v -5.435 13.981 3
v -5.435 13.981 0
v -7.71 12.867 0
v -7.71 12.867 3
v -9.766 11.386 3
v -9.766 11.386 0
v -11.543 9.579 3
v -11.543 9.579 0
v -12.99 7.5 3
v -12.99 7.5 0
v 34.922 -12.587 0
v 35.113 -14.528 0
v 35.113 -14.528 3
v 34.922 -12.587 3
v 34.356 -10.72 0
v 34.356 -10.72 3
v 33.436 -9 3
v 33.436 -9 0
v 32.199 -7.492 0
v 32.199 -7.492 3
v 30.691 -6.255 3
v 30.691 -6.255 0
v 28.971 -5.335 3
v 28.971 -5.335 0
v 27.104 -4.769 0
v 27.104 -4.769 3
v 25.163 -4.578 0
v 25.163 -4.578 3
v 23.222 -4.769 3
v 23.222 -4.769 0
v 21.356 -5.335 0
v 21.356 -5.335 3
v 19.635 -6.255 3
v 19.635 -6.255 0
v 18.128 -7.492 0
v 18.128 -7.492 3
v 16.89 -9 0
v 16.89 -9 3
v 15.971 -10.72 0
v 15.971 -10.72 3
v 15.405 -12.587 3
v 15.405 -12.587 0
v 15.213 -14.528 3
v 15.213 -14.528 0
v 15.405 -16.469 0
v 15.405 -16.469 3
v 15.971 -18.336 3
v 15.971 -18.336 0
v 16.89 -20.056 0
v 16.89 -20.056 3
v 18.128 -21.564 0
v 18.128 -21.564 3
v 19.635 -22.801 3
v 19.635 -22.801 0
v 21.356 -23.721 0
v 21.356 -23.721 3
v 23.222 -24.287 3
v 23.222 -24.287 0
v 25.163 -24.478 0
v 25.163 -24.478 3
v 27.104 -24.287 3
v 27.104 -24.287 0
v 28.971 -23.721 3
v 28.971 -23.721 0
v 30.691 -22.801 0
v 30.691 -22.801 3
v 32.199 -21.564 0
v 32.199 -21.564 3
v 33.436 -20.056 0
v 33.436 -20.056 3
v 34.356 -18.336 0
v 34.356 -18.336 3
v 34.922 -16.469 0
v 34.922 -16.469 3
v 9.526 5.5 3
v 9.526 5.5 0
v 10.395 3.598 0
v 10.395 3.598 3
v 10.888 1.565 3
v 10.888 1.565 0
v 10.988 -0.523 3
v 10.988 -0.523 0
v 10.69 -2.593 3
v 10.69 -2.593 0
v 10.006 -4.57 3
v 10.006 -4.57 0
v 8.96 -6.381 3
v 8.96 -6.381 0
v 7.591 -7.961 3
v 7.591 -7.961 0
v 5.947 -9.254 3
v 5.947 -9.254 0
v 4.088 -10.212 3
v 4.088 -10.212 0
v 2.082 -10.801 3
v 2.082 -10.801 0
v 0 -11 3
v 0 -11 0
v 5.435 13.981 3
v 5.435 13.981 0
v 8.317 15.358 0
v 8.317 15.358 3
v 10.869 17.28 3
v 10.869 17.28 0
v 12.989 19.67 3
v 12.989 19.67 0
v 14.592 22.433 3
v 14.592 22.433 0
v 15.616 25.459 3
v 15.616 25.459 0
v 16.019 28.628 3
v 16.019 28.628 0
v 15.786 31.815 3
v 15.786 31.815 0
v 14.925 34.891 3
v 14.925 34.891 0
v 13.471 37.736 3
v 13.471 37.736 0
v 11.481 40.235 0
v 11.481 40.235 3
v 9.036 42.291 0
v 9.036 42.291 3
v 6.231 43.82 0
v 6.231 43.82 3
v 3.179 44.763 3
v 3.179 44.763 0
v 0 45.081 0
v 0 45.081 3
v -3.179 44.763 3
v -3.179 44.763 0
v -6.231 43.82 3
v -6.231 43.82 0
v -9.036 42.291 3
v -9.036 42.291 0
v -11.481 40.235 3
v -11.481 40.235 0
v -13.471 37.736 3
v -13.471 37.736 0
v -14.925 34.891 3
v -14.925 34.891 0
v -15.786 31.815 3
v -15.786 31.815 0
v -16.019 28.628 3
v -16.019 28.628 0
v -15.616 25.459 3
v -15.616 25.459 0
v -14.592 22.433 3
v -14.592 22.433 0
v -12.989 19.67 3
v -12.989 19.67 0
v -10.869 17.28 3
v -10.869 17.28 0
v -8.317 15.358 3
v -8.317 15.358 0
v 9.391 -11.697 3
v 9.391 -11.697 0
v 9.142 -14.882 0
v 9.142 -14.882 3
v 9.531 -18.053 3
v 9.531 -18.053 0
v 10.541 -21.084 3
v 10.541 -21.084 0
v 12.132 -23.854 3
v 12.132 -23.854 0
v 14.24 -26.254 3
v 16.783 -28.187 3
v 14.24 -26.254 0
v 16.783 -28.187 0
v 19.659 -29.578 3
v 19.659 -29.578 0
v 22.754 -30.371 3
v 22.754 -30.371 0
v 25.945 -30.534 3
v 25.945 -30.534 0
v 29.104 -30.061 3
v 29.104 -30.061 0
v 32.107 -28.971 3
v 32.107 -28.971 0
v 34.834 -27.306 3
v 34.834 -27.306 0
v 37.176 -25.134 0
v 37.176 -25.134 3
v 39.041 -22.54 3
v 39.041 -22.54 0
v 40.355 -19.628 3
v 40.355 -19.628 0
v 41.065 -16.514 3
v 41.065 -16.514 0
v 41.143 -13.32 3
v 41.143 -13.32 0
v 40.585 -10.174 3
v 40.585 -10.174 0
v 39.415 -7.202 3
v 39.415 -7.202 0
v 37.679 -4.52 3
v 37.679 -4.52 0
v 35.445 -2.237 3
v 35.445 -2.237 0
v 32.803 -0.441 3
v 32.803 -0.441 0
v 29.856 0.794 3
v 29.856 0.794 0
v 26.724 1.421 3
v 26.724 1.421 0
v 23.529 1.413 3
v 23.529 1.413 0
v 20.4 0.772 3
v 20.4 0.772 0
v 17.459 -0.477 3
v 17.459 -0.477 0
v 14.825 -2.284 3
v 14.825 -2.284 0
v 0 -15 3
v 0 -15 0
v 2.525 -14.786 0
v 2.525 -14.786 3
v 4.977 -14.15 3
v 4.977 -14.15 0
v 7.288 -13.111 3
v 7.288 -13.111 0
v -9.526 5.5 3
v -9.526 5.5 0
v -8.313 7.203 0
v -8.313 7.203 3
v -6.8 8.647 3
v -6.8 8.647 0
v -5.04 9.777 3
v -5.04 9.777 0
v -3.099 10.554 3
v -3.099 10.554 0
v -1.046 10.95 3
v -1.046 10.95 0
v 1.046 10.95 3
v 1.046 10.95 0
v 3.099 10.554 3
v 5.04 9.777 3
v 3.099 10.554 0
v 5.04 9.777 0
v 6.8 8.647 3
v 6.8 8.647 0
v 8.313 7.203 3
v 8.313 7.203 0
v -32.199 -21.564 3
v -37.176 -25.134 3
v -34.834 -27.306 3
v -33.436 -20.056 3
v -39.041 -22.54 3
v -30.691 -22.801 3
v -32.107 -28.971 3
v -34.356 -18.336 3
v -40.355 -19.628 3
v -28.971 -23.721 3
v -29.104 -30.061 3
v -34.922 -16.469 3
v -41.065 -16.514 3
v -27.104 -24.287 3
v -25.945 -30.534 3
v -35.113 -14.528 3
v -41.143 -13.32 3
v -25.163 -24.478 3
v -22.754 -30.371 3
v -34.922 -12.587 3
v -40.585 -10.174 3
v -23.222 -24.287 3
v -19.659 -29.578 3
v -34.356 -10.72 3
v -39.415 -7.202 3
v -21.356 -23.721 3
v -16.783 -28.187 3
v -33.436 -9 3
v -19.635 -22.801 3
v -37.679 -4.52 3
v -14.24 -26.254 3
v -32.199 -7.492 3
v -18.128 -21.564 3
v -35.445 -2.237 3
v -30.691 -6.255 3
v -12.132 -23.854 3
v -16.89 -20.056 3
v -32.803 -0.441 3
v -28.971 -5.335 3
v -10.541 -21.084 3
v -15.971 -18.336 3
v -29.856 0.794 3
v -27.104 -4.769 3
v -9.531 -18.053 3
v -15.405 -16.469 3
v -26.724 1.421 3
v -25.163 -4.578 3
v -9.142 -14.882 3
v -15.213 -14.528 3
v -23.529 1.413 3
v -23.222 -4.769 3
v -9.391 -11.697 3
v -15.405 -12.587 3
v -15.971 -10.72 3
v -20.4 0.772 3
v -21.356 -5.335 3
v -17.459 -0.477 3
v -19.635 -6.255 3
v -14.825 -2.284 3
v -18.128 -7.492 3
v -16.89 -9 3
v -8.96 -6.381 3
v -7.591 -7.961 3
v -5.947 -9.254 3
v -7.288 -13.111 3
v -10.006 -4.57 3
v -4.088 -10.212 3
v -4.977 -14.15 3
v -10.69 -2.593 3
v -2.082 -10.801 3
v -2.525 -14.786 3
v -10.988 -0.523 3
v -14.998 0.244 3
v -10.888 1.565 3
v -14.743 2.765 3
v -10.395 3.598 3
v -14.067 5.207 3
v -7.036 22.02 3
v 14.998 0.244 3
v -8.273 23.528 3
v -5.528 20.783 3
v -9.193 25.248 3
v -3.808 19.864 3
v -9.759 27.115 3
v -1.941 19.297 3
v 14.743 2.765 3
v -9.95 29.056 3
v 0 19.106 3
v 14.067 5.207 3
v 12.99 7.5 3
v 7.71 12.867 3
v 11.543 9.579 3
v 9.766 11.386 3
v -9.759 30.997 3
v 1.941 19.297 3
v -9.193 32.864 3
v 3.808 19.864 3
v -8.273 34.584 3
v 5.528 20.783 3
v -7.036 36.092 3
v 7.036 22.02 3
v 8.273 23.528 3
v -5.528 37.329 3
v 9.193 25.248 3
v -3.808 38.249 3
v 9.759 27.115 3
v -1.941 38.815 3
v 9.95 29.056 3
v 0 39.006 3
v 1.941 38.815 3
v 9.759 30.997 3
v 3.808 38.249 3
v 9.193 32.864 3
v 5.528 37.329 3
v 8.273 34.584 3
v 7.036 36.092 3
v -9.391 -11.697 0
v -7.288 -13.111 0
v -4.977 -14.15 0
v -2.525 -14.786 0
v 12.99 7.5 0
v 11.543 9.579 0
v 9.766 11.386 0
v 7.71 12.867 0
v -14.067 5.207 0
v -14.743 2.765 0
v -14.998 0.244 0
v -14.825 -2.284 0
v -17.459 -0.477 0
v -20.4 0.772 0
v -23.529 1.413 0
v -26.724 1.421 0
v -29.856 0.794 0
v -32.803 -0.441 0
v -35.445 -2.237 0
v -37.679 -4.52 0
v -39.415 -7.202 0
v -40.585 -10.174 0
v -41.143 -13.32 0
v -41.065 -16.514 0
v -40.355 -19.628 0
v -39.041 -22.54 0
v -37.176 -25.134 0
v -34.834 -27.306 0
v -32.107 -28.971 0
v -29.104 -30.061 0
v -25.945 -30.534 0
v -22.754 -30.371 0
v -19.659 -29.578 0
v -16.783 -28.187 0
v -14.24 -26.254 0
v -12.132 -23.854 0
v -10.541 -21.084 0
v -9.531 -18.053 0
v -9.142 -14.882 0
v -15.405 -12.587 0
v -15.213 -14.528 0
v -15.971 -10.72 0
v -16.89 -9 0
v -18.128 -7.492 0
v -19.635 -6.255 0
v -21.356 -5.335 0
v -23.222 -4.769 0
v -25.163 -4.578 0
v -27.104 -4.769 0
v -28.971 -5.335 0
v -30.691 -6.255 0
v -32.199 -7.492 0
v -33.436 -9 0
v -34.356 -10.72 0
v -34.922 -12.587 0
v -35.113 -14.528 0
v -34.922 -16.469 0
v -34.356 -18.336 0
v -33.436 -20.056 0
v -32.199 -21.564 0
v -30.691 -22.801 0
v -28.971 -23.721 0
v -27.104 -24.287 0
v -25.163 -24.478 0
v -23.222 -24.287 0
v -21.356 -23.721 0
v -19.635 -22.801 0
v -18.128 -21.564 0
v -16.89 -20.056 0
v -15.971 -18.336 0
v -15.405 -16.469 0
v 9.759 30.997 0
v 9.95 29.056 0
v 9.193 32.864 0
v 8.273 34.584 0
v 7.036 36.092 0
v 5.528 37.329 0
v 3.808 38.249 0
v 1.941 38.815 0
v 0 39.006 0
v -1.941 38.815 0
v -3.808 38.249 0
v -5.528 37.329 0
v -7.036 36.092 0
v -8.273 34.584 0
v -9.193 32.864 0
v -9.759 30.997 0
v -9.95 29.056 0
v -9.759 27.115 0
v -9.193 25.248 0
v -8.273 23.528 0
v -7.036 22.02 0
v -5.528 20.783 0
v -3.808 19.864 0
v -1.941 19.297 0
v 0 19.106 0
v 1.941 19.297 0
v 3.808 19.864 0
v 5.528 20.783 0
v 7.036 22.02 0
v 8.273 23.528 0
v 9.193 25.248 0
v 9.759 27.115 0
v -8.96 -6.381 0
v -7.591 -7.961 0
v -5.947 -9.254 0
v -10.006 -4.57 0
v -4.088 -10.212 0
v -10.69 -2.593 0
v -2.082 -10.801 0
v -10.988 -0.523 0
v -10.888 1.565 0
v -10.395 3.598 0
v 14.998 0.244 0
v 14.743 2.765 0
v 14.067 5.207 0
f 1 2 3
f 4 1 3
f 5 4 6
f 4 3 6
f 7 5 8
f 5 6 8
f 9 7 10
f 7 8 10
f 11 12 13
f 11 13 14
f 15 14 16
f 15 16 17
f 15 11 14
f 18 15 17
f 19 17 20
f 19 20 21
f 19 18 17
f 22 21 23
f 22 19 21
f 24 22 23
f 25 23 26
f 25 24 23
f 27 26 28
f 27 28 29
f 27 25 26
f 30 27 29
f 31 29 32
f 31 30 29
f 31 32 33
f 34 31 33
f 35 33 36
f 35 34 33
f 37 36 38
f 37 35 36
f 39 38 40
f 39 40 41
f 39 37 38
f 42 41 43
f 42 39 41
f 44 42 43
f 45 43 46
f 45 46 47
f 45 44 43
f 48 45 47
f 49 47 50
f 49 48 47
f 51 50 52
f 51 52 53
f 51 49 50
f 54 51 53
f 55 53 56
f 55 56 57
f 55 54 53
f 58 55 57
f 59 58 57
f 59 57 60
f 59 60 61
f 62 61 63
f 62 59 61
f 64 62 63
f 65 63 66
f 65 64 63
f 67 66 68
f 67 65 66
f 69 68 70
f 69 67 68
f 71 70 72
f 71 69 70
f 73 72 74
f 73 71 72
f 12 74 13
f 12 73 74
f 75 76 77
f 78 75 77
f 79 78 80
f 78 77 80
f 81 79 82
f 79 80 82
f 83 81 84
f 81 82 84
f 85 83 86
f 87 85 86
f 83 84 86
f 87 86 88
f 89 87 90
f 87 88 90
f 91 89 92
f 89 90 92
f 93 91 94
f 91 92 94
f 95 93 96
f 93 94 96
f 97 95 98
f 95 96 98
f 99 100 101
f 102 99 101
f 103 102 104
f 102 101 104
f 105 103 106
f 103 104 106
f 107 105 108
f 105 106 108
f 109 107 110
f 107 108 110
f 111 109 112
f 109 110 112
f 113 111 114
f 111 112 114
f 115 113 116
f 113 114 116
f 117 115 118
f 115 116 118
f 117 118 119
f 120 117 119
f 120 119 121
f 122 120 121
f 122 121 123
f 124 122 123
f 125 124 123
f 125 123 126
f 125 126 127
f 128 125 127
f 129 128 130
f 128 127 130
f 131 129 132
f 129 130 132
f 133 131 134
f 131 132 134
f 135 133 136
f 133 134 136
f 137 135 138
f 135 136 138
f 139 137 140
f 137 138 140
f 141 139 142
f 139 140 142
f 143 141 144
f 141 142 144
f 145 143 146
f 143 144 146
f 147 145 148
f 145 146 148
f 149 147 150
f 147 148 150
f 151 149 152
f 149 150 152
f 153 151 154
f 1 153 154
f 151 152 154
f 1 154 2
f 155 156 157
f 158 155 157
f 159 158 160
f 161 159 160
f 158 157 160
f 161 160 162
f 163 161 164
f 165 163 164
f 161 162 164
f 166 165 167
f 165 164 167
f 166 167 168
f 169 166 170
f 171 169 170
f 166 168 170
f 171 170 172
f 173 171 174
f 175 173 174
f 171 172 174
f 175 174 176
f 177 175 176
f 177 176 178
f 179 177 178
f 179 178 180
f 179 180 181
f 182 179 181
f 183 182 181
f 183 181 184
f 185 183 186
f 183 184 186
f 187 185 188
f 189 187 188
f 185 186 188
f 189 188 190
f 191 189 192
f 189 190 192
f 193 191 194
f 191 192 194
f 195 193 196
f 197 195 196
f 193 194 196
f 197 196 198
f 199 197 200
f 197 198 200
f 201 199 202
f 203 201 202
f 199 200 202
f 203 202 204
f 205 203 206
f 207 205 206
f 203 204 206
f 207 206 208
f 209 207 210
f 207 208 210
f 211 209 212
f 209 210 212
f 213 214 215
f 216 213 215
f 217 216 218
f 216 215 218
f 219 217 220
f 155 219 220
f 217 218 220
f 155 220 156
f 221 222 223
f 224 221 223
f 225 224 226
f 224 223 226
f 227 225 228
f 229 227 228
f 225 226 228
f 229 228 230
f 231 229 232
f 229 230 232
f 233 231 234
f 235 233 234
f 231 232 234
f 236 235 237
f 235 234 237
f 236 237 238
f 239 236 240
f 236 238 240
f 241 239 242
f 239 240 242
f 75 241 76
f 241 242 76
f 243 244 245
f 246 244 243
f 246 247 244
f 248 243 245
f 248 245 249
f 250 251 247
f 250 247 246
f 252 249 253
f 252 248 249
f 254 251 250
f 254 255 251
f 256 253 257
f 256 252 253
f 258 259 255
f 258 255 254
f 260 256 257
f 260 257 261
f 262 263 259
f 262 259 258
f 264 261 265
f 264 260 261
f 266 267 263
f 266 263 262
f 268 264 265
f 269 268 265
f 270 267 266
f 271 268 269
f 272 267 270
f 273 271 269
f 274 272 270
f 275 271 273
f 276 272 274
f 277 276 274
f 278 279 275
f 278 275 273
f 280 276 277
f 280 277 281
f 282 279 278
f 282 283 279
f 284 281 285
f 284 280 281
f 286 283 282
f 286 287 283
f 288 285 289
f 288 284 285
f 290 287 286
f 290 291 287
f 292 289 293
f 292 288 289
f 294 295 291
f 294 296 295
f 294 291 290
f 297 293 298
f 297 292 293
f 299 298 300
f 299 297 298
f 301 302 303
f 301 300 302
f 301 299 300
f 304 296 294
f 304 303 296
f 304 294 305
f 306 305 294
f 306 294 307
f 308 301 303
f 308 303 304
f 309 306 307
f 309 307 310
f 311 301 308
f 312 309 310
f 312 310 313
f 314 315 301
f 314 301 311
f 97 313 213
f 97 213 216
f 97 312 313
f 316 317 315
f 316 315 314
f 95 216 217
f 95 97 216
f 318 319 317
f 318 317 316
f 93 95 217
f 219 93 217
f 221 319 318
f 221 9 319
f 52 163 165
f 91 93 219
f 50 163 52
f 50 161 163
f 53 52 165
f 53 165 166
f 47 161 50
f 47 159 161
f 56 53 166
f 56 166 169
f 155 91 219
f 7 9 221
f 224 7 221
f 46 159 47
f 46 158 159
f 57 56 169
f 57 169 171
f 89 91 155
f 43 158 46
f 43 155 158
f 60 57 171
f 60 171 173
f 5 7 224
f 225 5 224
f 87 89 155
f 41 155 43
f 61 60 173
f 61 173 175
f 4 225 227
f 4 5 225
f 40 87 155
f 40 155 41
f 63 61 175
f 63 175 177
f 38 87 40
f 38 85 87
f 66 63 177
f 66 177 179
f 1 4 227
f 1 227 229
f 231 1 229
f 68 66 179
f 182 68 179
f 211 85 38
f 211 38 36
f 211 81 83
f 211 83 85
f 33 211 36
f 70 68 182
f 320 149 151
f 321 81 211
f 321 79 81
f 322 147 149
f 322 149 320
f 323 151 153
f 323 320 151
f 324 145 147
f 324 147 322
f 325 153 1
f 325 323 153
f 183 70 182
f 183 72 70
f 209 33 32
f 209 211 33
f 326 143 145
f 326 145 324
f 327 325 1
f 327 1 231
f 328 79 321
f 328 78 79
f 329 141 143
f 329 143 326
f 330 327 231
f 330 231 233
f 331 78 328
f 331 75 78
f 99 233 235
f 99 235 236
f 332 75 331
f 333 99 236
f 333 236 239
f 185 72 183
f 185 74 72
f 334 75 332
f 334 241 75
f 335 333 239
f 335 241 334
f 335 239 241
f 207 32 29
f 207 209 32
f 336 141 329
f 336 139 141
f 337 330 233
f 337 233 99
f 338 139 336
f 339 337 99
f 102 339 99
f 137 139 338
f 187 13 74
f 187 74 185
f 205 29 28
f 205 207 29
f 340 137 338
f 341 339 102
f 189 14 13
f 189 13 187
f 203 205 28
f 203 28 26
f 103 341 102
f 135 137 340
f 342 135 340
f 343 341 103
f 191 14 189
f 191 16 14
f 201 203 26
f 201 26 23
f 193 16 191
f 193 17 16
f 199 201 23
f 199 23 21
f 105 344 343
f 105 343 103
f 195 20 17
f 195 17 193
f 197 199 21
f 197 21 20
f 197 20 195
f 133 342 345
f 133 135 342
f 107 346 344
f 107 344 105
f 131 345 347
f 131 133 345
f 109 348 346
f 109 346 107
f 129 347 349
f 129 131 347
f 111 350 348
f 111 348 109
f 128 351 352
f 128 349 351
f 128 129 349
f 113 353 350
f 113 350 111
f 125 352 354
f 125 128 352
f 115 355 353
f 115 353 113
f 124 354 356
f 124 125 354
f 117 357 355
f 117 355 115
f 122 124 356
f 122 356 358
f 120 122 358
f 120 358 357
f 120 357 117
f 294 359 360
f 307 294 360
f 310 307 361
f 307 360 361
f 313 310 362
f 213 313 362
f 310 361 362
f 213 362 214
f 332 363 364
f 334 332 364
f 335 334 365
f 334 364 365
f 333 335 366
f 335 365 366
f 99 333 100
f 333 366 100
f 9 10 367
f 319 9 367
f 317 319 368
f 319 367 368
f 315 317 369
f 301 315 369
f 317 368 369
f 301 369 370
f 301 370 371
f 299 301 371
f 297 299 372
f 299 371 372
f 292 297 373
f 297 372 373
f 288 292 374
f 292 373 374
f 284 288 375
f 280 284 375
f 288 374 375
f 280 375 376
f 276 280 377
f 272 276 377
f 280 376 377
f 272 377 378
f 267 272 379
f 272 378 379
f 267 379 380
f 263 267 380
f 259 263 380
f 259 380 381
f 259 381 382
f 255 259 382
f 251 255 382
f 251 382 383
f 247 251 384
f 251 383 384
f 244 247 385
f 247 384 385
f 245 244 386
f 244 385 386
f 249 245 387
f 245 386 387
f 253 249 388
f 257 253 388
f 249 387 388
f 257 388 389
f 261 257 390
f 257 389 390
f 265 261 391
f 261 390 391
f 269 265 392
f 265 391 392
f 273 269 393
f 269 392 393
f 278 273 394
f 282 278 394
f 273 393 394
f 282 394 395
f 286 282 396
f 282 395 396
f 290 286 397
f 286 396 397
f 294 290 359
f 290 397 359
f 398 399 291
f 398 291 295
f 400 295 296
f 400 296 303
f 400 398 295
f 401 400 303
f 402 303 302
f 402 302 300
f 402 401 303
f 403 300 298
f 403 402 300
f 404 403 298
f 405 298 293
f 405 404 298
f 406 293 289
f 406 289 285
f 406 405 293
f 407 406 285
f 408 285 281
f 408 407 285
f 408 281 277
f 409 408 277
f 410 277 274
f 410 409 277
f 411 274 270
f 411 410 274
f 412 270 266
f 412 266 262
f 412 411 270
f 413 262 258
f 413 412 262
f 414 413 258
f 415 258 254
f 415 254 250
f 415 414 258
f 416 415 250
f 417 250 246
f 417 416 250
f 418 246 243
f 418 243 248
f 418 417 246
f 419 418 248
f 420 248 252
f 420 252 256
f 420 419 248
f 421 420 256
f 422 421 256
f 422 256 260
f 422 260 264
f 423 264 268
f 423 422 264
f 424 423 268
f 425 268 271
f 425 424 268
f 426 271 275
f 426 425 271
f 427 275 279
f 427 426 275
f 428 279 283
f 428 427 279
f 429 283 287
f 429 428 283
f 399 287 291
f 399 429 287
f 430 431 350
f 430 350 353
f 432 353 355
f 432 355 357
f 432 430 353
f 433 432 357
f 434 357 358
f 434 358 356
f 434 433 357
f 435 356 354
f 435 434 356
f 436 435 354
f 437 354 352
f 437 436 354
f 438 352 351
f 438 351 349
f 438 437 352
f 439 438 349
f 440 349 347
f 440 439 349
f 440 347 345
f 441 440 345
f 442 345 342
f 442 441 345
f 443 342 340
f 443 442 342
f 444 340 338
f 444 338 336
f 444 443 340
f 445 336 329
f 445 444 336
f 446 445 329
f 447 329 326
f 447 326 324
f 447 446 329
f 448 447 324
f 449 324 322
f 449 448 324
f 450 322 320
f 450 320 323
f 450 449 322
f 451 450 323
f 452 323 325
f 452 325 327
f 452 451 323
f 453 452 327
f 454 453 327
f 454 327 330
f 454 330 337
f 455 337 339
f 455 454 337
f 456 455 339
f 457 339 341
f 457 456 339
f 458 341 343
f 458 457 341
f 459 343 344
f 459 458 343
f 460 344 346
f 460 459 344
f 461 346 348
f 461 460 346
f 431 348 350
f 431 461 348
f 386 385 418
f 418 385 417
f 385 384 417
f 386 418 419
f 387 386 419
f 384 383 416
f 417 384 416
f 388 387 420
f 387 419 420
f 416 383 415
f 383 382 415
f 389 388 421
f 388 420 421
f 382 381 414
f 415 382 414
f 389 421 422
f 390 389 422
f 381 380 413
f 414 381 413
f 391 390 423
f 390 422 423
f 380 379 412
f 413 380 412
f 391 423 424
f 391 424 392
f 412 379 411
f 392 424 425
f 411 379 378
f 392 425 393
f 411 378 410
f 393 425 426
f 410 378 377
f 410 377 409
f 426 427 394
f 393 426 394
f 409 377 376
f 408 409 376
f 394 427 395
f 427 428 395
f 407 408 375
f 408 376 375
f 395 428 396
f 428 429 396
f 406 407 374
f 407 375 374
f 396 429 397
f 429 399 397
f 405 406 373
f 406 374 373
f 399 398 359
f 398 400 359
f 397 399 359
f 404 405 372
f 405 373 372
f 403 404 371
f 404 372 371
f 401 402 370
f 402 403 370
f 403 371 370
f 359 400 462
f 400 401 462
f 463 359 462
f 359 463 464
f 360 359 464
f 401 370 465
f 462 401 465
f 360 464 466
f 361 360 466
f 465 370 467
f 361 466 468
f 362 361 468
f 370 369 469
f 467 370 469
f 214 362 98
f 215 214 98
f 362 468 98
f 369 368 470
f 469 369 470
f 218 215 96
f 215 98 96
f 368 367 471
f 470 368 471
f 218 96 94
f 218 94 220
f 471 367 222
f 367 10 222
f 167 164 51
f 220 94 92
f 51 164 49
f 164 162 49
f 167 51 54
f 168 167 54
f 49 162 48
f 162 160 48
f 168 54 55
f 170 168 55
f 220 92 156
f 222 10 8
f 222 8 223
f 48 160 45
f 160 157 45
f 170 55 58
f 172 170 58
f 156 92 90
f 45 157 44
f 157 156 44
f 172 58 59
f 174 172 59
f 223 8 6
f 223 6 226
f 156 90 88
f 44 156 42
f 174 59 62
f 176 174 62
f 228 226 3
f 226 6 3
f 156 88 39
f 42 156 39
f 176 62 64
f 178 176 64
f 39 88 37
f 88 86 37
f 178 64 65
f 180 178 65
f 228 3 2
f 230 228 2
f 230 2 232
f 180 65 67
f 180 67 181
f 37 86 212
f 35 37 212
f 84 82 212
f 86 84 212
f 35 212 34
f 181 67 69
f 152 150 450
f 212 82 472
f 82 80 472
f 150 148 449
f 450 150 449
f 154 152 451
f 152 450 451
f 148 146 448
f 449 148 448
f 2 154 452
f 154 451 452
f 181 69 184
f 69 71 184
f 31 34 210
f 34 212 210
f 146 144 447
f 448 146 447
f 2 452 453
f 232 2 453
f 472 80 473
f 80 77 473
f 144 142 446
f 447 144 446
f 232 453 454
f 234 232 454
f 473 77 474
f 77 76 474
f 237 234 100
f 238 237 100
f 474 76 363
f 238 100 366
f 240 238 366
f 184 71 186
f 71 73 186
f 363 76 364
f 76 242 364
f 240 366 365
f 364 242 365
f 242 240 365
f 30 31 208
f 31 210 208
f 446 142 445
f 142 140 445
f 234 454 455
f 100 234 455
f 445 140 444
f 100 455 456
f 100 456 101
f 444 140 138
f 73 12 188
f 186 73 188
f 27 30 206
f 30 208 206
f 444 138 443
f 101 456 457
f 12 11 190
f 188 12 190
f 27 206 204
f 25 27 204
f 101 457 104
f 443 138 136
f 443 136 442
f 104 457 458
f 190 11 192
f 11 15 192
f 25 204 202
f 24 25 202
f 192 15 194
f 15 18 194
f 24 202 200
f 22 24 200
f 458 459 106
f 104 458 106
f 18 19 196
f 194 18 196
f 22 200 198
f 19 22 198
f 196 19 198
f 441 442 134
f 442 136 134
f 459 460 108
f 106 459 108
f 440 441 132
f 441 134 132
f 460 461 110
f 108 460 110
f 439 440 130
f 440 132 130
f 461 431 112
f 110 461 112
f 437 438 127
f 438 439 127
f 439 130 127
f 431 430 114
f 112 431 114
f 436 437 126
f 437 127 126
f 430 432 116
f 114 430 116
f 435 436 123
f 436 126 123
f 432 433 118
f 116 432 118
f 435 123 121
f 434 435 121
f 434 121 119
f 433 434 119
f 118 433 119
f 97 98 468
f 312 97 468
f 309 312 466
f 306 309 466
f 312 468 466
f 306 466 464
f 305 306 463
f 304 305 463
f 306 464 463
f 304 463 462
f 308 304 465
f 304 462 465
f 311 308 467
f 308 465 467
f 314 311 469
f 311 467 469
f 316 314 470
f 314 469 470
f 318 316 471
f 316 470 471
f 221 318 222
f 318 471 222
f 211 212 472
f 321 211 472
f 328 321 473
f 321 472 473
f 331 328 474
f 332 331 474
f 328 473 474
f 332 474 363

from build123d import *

# Parameters (mm, degrees)
F0_R     = 9.95
F1_DEPTH = 3


with BuildPart() as f1:
    # F0 (on Top) → F1 (new body)
    with BuildSketch(Plane.XY):
        with BuildLine():
            ThreePointArc((14.825089, -2.284017), (14.743027, 2.764626), (12.990381, 7.5))
            ThreePointArc((12.990381, 7.5), (9.76575, 11.385523), (5.434528, 13.980912))
            ThreePointArc((5.434528, 13.980912), (0, 45.080944), (-5.434528, 13.980912))
            ThreePointArc((-5.434528, 13.980912), (-9.76575, 11.385523), (-12.990381, 7.5))
            ThreePointArc((-12.990381, 7.5), (-14.743027, 2.764626), (-14.825089, -2.284017))
            ThreePointArc((-14.825089, -2.284017), (-39.041242, -22.540472), (-9.390561, -11.696895))
            ThreePointArc((-9.390561, -11.696895), (-4.977277, -14.150149), (0, -15))
            ThreePointArc((0, -15), (4.977277, -14.150149), (9.390561, -11.696895))
            ThreePointArc((9.390561, -11.696895), (39.041242, -22.540472), (14.825089, -2.284017))
        make_face()
        with Locations((-25.163324, -14.528052)):
            Circle(F0_R, mode=Mode.SUBTRACT)
        with BuildLine():
            ThreePointArc((-9.526279, 5.5), (0, 11), (9.526279, 5.5))
            ThreePointArc((9.526279, 5.5), (9.526279, -5.5), (0, -11))
            ThreePointArc((0, -11), (-9.526279, -5.5), (-9.526279, 5.5))
        make_face(mode=Mode.SUBTRACT)
        with Locations((25.163324, -14.528052)):
            Circle(F0_R, mode=Mode.SUBTRACT)
        with Locations((0, 29.056104)):
            Circle(F0_R, mode=Mode.SUBTRACT)
    extrude(amount=F1_DEPTH)


solid = f1.part
